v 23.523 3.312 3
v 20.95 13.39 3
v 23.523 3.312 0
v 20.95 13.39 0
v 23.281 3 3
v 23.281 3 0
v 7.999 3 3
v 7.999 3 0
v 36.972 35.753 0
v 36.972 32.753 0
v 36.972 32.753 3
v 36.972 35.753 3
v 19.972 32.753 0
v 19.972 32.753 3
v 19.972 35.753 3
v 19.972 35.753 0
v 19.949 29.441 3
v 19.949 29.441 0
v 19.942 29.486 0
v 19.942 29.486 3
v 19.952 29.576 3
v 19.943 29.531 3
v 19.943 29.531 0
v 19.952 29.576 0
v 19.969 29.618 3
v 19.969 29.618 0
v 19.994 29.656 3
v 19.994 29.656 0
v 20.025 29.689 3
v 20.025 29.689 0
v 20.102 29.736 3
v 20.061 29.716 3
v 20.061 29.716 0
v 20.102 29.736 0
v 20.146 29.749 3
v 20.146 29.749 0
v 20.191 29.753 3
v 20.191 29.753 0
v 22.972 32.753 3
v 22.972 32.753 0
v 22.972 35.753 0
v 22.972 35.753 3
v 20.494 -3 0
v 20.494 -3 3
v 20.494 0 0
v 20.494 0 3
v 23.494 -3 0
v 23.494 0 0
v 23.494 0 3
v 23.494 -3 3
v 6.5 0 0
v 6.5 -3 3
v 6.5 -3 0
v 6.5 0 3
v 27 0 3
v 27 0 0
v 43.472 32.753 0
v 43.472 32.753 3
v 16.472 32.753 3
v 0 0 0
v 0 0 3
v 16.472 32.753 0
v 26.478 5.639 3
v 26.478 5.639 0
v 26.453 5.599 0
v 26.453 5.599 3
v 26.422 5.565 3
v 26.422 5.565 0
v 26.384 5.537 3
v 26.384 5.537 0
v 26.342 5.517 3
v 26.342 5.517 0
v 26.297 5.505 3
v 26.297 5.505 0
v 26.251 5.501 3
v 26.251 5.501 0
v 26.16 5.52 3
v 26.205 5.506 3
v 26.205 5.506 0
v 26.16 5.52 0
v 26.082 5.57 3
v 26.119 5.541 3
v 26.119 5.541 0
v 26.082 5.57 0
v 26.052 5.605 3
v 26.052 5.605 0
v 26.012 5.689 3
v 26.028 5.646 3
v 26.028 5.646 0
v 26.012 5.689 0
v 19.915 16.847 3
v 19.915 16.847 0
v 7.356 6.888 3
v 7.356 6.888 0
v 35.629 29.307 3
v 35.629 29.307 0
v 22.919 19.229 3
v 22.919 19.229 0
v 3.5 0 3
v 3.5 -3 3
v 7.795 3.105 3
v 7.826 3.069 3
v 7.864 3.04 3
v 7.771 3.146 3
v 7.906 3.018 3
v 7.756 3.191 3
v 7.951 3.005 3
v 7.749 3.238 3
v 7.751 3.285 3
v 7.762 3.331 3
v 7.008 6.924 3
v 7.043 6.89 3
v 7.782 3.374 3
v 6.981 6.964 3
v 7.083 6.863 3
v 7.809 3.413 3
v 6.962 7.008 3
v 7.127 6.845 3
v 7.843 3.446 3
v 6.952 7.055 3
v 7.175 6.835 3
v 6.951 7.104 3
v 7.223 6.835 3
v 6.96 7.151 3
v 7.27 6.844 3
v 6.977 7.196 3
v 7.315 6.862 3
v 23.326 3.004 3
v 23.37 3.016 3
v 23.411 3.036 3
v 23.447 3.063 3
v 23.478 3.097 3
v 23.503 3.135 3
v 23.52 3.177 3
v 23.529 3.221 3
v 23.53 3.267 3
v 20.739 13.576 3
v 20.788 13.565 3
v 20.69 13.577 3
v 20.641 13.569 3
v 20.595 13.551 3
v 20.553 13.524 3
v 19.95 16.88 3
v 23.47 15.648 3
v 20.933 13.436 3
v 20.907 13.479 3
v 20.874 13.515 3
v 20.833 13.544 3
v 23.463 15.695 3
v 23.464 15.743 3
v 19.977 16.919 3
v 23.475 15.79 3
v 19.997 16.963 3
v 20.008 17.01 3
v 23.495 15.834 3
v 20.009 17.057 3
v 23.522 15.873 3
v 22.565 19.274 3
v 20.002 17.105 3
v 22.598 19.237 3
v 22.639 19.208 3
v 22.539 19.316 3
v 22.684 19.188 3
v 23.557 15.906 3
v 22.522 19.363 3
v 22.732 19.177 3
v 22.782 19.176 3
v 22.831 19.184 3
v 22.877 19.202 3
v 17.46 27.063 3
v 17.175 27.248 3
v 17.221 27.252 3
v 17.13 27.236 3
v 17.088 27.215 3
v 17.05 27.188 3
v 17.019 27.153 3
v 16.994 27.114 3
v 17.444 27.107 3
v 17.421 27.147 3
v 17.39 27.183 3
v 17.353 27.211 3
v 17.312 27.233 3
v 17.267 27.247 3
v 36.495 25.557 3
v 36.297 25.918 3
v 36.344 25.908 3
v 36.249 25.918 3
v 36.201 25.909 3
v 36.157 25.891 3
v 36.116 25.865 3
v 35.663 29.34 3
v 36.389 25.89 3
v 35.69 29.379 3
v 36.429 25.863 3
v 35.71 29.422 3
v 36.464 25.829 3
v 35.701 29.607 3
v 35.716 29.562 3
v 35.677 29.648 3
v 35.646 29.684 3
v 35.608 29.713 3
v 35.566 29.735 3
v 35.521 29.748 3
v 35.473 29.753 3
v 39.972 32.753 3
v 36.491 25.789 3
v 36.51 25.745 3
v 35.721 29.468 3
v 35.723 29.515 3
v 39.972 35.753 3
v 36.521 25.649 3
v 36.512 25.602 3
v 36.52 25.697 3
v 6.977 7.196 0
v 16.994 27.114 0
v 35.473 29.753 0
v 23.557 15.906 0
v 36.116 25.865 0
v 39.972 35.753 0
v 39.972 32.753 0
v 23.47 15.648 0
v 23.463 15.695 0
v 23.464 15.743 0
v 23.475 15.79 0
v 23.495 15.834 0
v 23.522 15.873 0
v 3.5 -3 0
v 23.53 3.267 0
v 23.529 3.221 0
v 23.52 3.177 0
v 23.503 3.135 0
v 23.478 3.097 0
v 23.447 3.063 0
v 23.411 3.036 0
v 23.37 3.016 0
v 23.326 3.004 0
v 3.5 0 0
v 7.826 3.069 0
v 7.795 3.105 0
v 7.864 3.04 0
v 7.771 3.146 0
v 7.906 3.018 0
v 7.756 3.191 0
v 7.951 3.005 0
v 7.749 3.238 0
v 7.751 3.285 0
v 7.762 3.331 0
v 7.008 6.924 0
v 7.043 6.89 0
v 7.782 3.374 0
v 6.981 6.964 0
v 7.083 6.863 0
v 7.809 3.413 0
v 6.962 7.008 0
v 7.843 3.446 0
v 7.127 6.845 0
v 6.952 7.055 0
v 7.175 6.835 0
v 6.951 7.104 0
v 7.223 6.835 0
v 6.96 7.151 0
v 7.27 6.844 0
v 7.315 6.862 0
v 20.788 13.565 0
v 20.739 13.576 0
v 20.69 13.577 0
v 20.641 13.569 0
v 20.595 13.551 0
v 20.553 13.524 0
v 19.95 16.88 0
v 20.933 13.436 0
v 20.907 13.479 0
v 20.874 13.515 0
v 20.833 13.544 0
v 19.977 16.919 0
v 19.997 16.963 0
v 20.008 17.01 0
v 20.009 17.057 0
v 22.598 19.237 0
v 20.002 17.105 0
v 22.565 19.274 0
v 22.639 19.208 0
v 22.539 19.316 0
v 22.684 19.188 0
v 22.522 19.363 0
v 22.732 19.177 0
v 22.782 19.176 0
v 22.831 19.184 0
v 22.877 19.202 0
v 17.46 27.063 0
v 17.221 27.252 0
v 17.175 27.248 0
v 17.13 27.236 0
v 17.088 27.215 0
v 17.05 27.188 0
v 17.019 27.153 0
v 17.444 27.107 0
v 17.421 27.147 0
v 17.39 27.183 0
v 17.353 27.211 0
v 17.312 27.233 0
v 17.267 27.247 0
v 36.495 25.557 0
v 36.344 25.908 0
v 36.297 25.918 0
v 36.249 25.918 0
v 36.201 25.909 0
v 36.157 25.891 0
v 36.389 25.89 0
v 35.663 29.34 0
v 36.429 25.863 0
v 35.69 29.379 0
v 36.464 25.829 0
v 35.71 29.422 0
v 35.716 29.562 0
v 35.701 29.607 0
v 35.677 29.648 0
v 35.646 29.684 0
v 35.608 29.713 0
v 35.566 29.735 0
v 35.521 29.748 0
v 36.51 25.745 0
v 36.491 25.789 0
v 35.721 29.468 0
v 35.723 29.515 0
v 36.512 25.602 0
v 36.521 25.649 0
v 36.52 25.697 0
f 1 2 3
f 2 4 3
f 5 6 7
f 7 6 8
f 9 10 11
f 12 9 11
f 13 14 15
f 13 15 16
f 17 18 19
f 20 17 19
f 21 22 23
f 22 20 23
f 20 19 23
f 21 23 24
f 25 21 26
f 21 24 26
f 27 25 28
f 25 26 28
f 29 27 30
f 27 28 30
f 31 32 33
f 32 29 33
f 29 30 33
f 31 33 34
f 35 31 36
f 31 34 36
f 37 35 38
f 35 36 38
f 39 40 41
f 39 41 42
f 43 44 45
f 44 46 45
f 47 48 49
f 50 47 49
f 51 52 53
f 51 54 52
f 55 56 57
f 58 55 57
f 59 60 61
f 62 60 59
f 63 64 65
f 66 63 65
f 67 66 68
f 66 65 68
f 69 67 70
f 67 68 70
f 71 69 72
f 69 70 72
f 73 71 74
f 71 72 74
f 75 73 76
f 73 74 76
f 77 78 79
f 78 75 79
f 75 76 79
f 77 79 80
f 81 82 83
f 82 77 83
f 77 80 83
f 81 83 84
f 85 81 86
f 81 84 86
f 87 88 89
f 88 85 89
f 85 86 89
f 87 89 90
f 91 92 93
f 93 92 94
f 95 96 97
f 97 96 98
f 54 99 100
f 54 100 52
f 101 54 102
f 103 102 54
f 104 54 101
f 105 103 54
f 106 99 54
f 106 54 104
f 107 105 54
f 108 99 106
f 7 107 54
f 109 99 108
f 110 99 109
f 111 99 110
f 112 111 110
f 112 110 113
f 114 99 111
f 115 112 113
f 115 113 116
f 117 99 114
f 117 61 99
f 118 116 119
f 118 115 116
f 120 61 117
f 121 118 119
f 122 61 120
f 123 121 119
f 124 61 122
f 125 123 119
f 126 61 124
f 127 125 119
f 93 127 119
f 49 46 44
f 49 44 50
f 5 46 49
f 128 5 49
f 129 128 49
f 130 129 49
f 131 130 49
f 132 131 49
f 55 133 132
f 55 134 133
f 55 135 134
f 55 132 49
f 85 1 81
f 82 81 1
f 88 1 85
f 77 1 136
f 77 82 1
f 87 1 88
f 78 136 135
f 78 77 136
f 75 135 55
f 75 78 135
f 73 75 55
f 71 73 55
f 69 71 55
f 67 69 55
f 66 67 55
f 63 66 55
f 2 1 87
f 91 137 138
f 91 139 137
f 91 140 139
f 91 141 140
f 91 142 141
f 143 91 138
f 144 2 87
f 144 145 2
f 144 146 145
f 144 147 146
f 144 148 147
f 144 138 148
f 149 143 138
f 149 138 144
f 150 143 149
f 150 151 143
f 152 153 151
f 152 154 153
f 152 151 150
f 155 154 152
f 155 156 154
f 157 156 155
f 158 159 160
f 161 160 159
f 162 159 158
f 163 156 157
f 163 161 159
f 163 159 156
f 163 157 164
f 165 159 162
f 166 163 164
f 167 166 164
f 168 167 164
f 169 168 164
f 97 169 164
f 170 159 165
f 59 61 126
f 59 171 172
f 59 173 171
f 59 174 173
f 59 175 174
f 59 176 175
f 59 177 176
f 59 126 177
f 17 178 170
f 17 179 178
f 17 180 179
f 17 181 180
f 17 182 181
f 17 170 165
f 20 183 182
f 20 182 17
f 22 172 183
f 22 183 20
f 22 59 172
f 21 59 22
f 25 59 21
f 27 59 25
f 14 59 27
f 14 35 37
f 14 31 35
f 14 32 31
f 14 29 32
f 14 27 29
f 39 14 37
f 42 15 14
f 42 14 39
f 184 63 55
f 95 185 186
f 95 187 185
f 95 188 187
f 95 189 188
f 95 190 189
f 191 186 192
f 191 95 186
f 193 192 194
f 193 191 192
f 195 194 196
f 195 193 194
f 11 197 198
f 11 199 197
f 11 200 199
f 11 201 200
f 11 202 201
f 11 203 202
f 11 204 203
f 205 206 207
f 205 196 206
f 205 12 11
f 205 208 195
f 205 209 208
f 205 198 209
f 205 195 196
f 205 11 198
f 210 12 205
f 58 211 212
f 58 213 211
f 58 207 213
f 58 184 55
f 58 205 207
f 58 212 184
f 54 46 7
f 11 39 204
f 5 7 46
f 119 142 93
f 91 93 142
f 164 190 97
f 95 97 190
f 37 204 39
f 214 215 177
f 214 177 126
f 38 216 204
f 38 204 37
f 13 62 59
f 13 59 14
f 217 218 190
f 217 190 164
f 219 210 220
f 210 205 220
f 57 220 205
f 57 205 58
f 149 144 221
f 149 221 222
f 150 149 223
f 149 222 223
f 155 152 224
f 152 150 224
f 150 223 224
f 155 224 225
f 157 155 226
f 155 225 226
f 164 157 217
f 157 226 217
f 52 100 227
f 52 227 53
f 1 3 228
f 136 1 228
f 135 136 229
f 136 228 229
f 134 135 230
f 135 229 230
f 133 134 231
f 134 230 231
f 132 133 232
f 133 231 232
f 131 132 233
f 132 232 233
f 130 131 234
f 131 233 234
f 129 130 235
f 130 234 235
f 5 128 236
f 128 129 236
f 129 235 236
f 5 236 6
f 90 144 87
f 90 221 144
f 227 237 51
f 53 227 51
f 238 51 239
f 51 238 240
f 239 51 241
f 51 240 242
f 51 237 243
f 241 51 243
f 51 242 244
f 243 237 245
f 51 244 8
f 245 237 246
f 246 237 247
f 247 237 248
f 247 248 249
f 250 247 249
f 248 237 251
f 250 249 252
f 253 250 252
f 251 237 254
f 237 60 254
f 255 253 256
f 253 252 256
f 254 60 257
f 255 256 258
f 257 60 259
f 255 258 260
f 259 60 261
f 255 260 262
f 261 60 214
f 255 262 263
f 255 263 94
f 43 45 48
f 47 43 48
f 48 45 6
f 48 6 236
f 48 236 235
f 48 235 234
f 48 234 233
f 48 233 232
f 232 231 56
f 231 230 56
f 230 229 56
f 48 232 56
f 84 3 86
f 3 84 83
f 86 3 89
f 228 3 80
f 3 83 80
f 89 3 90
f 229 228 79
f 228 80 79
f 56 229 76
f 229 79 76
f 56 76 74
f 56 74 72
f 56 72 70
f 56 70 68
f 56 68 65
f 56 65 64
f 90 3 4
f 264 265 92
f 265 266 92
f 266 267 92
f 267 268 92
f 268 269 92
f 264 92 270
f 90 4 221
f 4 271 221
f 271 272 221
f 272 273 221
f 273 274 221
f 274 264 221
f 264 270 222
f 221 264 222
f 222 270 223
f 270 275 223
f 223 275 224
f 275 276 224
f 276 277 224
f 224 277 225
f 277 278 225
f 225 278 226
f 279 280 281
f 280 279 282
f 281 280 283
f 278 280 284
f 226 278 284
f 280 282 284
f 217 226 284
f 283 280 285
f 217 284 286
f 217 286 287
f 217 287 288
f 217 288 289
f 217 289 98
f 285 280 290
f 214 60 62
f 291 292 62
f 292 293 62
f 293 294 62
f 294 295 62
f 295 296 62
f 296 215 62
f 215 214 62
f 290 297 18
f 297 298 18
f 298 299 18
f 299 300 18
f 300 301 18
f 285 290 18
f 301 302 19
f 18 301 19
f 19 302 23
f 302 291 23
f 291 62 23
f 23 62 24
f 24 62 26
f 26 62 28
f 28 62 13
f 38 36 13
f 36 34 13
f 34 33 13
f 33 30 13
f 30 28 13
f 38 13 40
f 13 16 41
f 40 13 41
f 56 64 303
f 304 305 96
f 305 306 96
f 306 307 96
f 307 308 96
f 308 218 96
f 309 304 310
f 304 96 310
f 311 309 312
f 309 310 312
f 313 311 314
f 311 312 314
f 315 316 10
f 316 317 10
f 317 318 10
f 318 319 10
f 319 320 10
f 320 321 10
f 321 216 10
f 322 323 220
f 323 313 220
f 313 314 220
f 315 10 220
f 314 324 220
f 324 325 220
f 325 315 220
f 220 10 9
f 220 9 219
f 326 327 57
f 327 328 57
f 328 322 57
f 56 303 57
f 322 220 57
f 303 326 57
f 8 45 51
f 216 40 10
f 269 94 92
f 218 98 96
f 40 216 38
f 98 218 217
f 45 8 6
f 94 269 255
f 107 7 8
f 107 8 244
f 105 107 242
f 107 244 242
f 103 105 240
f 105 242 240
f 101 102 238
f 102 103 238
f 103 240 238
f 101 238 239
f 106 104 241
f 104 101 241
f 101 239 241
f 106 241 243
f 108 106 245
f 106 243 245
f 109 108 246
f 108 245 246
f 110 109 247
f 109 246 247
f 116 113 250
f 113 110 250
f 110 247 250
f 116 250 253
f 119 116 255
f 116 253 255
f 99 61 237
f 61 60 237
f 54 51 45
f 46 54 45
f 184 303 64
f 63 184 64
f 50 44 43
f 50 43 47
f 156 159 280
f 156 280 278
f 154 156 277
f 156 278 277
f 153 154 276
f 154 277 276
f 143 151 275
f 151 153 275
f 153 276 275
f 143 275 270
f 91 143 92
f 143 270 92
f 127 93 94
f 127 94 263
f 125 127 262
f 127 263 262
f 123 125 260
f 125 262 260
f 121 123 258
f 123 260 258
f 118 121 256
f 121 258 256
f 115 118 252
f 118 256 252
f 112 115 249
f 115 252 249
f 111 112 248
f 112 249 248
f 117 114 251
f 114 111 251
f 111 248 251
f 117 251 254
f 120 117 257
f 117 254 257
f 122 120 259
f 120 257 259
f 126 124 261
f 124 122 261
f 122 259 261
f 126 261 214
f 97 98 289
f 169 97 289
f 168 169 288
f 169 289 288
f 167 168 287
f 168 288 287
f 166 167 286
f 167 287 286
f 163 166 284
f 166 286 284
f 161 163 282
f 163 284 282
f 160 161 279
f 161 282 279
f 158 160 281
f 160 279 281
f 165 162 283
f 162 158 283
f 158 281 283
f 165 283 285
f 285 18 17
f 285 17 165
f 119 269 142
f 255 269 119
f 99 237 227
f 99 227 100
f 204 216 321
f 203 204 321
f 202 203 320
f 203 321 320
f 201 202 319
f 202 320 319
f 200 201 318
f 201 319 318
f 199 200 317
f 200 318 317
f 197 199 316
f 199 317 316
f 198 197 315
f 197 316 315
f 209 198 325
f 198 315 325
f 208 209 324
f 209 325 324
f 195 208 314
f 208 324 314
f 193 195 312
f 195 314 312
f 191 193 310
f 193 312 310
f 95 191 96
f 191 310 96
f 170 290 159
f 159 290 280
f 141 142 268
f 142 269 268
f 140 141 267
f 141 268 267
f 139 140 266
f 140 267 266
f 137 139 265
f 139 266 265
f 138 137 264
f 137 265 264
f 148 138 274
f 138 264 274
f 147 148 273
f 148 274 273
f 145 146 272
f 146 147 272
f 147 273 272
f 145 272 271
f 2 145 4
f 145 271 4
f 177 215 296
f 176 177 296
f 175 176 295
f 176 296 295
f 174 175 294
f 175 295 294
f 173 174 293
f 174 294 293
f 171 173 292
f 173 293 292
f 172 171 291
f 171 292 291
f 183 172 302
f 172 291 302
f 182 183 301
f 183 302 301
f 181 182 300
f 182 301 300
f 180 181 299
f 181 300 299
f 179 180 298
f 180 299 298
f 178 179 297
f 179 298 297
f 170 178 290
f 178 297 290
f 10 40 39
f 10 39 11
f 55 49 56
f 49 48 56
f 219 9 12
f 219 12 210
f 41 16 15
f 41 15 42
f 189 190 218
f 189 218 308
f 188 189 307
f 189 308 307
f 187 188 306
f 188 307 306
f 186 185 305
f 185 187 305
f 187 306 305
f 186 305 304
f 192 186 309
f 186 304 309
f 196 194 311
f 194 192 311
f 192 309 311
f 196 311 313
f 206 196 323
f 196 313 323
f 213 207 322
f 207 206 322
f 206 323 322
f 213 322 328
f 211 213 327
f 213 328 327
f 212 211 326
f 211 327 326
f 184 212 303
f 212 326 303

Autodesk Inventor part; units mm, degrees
ref_plane "YZ Plane" through (0, 0, 0) normal (1, 0, 0) x (0, 1, 0)
ref_plane "XZ Plane" through (0, 0, 0) normal (0, 1, 0) x (-1, 0, 0)
ref_plane "XY Plane" through (0, 0, 0) normal (0, 0, 1) x (1, 0, 0)
sketch "Esboço1" plane through (0, 0, 0) normal (0, 0, 1) x (1, 0, 0)
  line L0 (0, 0) -> (16.4719, 32.7528)
  line L1 (16.4719, 32.7528) -> (43.4719, 32.7528)
  line L2 (0, 0) -> (27, 0)
  line L3 (27, 0) -> (43.4719, 32.7528)
  line L4 (16.9941, 27.1139) -> (6.9771, 7.1962)
  line L5 (35.4733, 29.7528) -> (20.1912, 29.7528)
  line L6 (23.2808, 3) -> (7.9986, 3)
  line L7 (36.4948, 25.5566) -> (26.4779, 5.6389)
  arc A0 (7.8433, 3.4459) -> (7.9986, 3) centre (7.9986, 3.25) ccw
  arc A1 (6.9771, 7.1962) -> (7.3558, 6.888) centre (7.2005, 7.0839) ccw
  arc A2 (36.4948, 25.5566) -> (36.1161, 25.8648) centre (36.2715, 25.6689) ccw
  arc A3 (35.6286, 29.3069) -> (35.4733, 29.7528) centre (35.4733, 29.5028) ccw
  arc A4 (17.4597, 27.0634) -> (16.9941, 27.1139) centre (17.2174, 27.0016) ccw
  arc A5 (20.1912, 29.7528) -> (19.9489, 29.441) centre (20.1912, 29.5028) ccw
  line L8 (17.4597, 27.0634) -> (20.002, 17.1046)
  line L9 (20.9503, 13.3898) -> (23.523, 3.3118)
  line L10 (36.1161, 25.8648) -> (23.5569, 15.9059)
  line L11 (20.5527, 13.5238) -> (7.8433, 3.4459)
  line L12 (19.9489, 29.441) -> (22.5216, 19.363)
  line L13 (23.47, 15.6482) -> (26.0123, 5.6894)
  line L14 (35.6286, 29.3069) -> (22.9192, 19.229)
  line L15 (19.9151, 16.8469) -> (7.3558, 6.888)
  arc A6 (20.9503, 13.3898) -> (20.5527, 13.5238) centre (20.7081, 13.3279) ccw
  arc A7 (19.9151, 16.8469) -> (20.002, 17.1046) centre (19.7597, 17.0428) ccw
  arc A8 (22.5216, 19.363) -> (22.9192, 19.229) centre (22.7639, 19.4249) ccw
  arc A9 (23.5569, 15.9059) -> (23.47, 15.6482) centre (23.7122, 15.71) ccw
  arc A10 (23.2808, 3) -> (23.523, 3.3118) centre (23.2808, 3.25) ccw
  arc A11 (26.0123, 5.6894) -> (26.4779, 5.6389) centre (26.2545, 5.7512) ccw
extrude "Extrusão1" add sketch "Esboço1" along normal blind 3
sketch "Esboço2" plane through (16.4719, 32.7528, 0) normal (0, 1, 0) x (1, 0, 0)
  line L0 (27, 0) -> (0, 0) projected
  line L1 (27, -3) -> (0, -3) projected
  line L2 (23.5, 0) -> (20.5, 0)
  line L3 (20.5, 0) -> (20.5, -3)
  line L4 (20.5, -3) -> (23.5, -3)
  line L5 (23.5, -3) -> (23.5, 0)
  line L6 (3.5, 0) -> (6.5, 0)
  line L7 (6.5, 0) -> (6.5, -3)
  line L8 (6.5, -3) -> (3.5, -3)
  line L9 (3.5, -3) -> (3.5, 0)
  point P0 (-16.4719, 0)
  point P1 (3.5, -3)
  point P2 (6.5, -3)
  point P3 (6.5, 0)
  dimension "d13" = 3
  dimension "d14" = 3
  dimension "d61" = 3
  dimension "d62" = 3
extrude "Extrusão2" add sketch "Esboço2" along normal blind 3 contours L5 L1 L3 L0 | L7 L1 L9 L0
sketch "Esboço3" plane through (0, 0, 0) normal (0, -1, 0) x (1, 0, 0)
  line L0 (3.5, 3) -> (6.5, 3)
  line L1 (6.5, 3) -> (6.5, 0)
  line L2 (6.5, 0) -> (3.5, 0)
  line L3 (3.5, 0) -> (3.5, 3)
  line L4 (23.4939, 3) -> (20.4939, 3)
  line L5 (20.4939, 3) -> (20.4939, 0)
  line L6 (20.4939, 0) -> (23.4939, 0)
  line L7 (23.4939, 0) -> (23.4939, 3)
  point P0 (0, 0)
  dimension "d65" = 3
  dimension "d66" = 3
  dimension "d67" = 3
  dimension "d68" = 3
extrude "Extrusão3" add sketch "Esboço3" along normal blind 3
properties part number "ENTRE_ASA"
